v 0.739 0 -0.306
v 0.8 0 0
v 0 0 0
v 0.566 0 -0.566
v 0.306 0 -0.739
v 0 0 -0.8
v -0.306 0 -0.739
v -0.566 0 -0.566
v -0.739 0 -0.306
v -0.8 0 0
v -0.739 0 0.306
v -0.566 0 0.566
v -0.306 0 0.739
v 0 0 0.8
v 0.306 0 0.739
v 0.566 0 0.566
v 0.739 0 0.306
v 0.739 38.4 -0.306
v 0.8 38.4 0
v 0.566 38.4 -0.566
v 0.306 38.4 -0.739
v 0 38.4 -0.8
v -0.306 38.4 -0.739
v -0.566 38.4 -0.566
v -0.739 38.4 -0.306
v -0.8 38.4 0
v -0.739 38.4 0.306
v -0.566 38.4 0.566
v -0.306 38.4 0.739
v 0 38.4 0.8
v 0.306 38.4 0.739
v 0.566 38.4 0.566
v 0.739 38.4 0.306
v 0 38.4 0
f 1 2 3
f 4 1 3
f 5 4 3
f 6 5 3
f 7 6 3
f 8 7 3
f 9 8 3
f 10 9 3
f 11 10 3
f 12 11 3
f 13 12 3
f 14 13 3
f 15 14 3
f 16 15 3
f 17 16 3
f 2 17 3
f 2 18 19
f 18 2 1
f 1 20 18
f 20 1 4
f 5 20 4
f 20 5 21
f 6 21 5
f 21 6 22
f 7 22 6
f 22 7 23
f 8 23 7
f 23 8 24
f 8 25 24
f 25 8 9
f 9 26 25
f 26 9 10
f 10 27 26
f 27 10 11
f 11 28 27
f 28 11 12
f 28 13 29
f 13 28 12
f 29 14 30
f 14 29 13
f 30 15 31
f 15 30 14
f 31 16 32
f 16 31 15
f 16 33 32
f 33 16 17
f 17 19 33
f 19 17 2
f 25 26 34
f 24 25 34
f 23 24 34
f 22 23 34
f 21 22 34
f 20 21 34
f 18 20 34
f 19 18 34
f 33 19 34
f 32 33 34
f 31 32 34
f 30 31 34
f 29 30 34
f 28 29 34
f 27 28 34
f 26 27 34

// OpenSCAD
// file: ../p/4-4edge.scad
use <../lib.scad>
function ldraw_lib__4_4edge() = [
// 0 Circle 1.0
// 0 Name: 4-4edge.dat
// 0 Author: James Jessiman
// 0 !LDRAW_ORG Primitive UPDATE 2017-01
// 0 !LICENSE Licensed under CC BY 2.0 and CC BY 4.0 : see CAreadme.txt
// 
// 0 BFC CERTIFY CCW
  [0,"BFC","CERTIFY"],
  [0,"BFC","CCW"],
// 
// 0 !HISTORY 1998-12-15 [PTadmin] Official Update 1998-10
// 0 !HISTORY 2005-12-28 [PTadmin] Official Update 2005-01
// 0 !HISTORY 2007-06-24 [PTadmin] Header formatted for Contributor Agreement
// 0 !HISTORY 2008-07-01 [PTadmin] Official Update 2008-01
// 0 !HISTORY 2017-01-15 [Steffen] BFCed
// 0 !HISTORY 2017-12-30 [PTadmin] Official Update 2017-01
// 
// 
// 2 24 1 0 0 0.9239 0 0.3827
  [2,24,1,0,0,0.9239,0,0.3827],
// 2 24 0.9239 0 0.3827 0.7071 0 0.7071
  [2,24,0.9239,0,0.3827,0.7071,0,0.7071],
// 2 24 0.7071 0 0.7071 0.3827 0 0.9239
  [2,24,0.7071,0,0.7071,0.3827,0,0.9239],
// 2 24 0.3827 0 0.9239 0 0 1
  [2,24,0.3827,0,0.9239,0,0,1],
// 2 24 0 0 1 -0.3827 0 0.9239
  [2,24,0,0,1,-0.3827,0,0.9239],
// 2 24 -0.3827 0 0.9239 -0.7071 0 0.7071
  [2,24,-0.3827,0,0.9239,-0.7071,0,0.7071],
// 2 24 -0.7071 0 0.7071 -0.9239 0 0.3827
  [2,24,-0.7071,0,0.7071,-0.9239,0,0.3827],
// 2 24 -0.9239 0 0.3827 -1 0 -0
  [2,24,-0.9239,0,0.3827,-1,0,-0],
// 2 24 -1 0 -0 -0.9239 0 -0.3827
  [2,24,-1,0,-0,-0.9239,0,-0.3827],
// 2 24 -0.9239 0 -0.3827 -0.7071 0 -0.7071
  [2,24,-0.9239,0,-0.3827,-0.7071,0,-0.7071],
// 2 24 -0.7071 0 -0.7071 -0.3827 0 -0.9239
  [2,24,-0.7071,0,-0.7071,-0.3827,0,-0.9239],
// 2 24 -0.3827 0 -0.9239 0 0 -1
  [2,24,-0.3827,0,-0.9239,0,0,-1],
// 2 24 0 0 -1 0.3827 0 -0.9239
  [2,24,0,0,-1,0.3827,0,-0.9239],
// 2 24 0.3827 0 -0.9239 0.7071 0 -0.7071
  [2,24,0.3827,0,-0.9239,0.7071,0,-0.7071],
// 2 24 0.7071 0 -0.7071 0.9239 0 -0.3827
  [2,24,0.7071,0,-0.7071,0.9239,0,-0.3827],
// 2 24 0.9239 0 -0.3827 1 0 0
  [2,24,0.9239,0,-0.3827,1,0,0],
];
module ldraw_lib__4_4edge(step=0, col=false, unit=2/5, alt=false, line=0.2, solid=!$preview)
    makepoly(ldraw_lib__4_4edge(), step=step, col=col, unit=unit, alt=alt, line=line, solid=solid);
ldraw_lib__4_4edge(line=0.2);
// file: ../p/4-4cyli.scad
use <../lib.scad>
function ldraw_lib__4_4cyli() = [
// 0 Cylinder 1.0
// 0 Name: 4-4cyli.dat
// 0 Author: James Jessiman
// 0 !LDRAW_ORG Primitive UPDATE 2005-01
// 0 !LICENSE Licensed under CC BY 2.0 and CC BY 4.0 : see CAreadme.txt
// 
// 0 BFC CERTIFY CCW
  [0,"BFC","CERTIFY"],
  [0,"BFC","CCW"],
// 
// 0 !HISTORY 1998-12-15 [PTadmin] Official Update 1998-10
// 0 !HISTORY 2002-03-23 [sbliss] Added BFC statement; merged headers from files in distributions LDraw 0.27 and Complete.
// 0 !HISTORY 2002-04-25 [PTadmin] Official Update 2002-02
// 0 !HISTORY 2004-12-14 [guyvivan] BFC CCW
// 0 !HISTORY 2005-12-28 [PTadmin] Official Update 2005-01
// 0 !HISTORY 2007-06-24 [PTadmin] Header formatted for Contributor Agreement
// 0 !HISTORY 2008-07-01 [PTadmin] Official Update 2008-01
// 
// 
// 4 16 1 1 0 0.9239 1 0.3827 0.9239 0 0.3827 1 0 0
  [4,16,1,1,0,0.9239,1,0.3827,0.9239,0,0.3827,1,0,0],
// 5 24 1 0 0 1 1 0 0.9239 0 0.3827 0.9239 0 -0.3827
  [5,24,1,0,0,1,1,0,0.9239,0,0.3827,0.9239,0,-0.3827],
// 4 16 0.9239 1 0.3827 0.7071 1 0.7071 0.7071 0 0.7071 0.9239 0 0.3827
  [4,16,0.9239,1,0.3827,0.7071,1,0.7071,0.7071,0,0.7071,0.9239,0,0.3827],
// 5 24 0.9239 0 0.3827 0.9239 1 0.3827 0.7071 0 0.7071 1 0 0
  [5,24,0.9239,0,0.3827,0.9239,1,0.3827,0.7071,0,0.7071,1,0,0],
// 4 16 0.7071 1 0.7071 0.3827 1 0.9239 0.3827 0 0.9239 0.7071 0 0.7071
  [4,16,0.7071,1,0.7071,0.3827,1,0.9239,0.3827,0,0.9239,0.7071,0,0.7071],
// 5 24 0.7071 0 0.7071 0.7071 1 0.7071 0.3827 0 0.9239 0.9239 0 0.3827
  [5,24,0.7071,0,0.7071,0.7071,1,0.7071,0.3827,0,0.9239,0.9239,0,0.3827],
// 4 16 0.3827 1 0.9239 0 1 1 0 0 1 0.3827 0 0.9239
  [4,16,0.3827,1,0.9239,0,1,1,0,0,1,0.3827,0,0.9239],
// 5 24 0.3827 0 0.9239 0.3827 1 0.9239 0 0 1 0.7071 0 0.7071
  [5,24,0.3827,0,0.9239,0.3827,1,0.9239,0,0,1,0.7071,0,0.7071],
// 4 16 0 1 1 -0.3827 1 0.9239 -0.3827 0 0.9239 0 0 1
  [4,16,0,1,1,-0.3827,1,0.9239,-0.3827,0,0.9239,0,0,1],
// 5 24 0 0 1 0 1 1 -0.3827 0 0.9239 0.3827 0 0.9239
  [5,24,0,0,1,0,1,1,-0.3827,0,0.9239,0.3827,0,0.9239],
// 4 16 -0.3827 1 0.9239 -0.7071 1 0.7071 -0.7071 0 0.7071 -0.3827 0 0.9239
  [4,16,-0.3827,1,0.9239,-0.7071,1,0.7071,-0.7071,0,0.7071,-0.3827,0,0.9239],
// 5 24 -0.3827 0 0.9239 -0.3827 1 0.9239 -0.7071 0 0.7071 0 0 1
  [5,24,-0.3827,0,0.9239,-0.3827,1,0.9239,-0.7071,0,0.7071,0,0,1],
// 4 16 -0.7071 1 0.7071 -0.9239 1 0.3827 -0.9239 0 0.3827 -0.7071 0 0.7071
  [4,16,-0.7071,1,0.7071,-0.9239,1,0.3827,-0.9239,0,0.3827,-0.7071,0,0.7071],
// 5 24 -0.7071 0 0.7071 -0.7071 1 0.7071 -0.9239 0 0.3827 -0.3827 0 0.9239
  [5,24,-0.7071,0,0.7071,-0.7071,1,0.7071,-0.9239,0,0.3827,-0.3827,0,0.9239],
// 4 16 -0.9239 1 0.3827 -1 1 0 -1 0 0 -0.9239 0 0.3827
  [4,16,-0.9239,1,0.3827,-1,1,0,-1,0,0,-0.9239,0,0.3827],
// 5 24 -0.9239 0 0.3827 -0.9239 1 0.3827 -1 0 0 -0.7071 0 0.7071
  [5,24,-0.9239,0,0.3827,-0.9239,1,0.3827,-1,0,0,-0.7071,0,0.7071],
// 4 16 -1 1 0 -0.9239 1 -0.3827 -0.9239 0 -0.3827 -1 0 0
  [4,16,-1,1,0,-0.9239,1,-0.3827,-0.9239,0,-0.3827,-1,0,0],
// 5 24 -1 0 0 -1 1 0 -0.9239 0 -0.3827 -0.9239 0 0.3827
  [5,24,-1,0,0,-1,1,0,-0.9239,0,-0.3827,-0.9239,0,0.3827],
// 4 16 -0.9239 1 -0.3827 -0.7071 1 -0.7071 -0.7071 0 -0.7071 -0.9239 0 -0.3827
  [4,16,-0.9239,1,-0.3827,-0.7071,1,-0.7071,-0.7071,0,-0.7071,-0.9239,0,-0.3827],
// 5 24 -0.9239 0 -0.3827 -0.9239 1 -0.3827 -0.7071 0 -0.7071 -1 0 0
  [5,24,-0.9239,0,-0.3827,-0.9239,1,-0.3827,-0.7071,0,-0.7071,-1,0,0],
// 4 16 -0.7071 1 -0.7071 -0.3827 1 -0.9239 -0.3827 0 -0.9239 -0.7071 0 -0.7071
  [4,16,-0.7071,1,-0.7071,-0.3827,1,-0.9239,-0.3827,0,-0.9239,-0.7071,0,-0.7071],
// 5 24 -0.7071 0 -0.7071 -0.7071 1 -0.7071 -0.3827 0 -0.9239 -0.9239 0 -0.3827
  [5,24,-0.7071,0,-0.7071,-0.7071,1,-0.7071,-0.3827,0,-0.9239,-0.9239,0,-0.3827],
// 4 16 -0.3827 1 -0.9239 0 1 -1 0 0 -1 -0.3827 0 -0.9239
  [4,16,-0.3827,1,-0.9239,0,1,-1,0,0,-1,-0.3827,0,-0.9239],
// 5 24 -0.3827 0 -0.9239 -0.3827 1 -0.9239 0 0 -1 -0.7071 0 -0.7071
  [5,24,-0.3827,0,-0.9239,-0.3827,1,-0.9239,0,0,-1,-0.7071,0,-0.7071],
// 4 16 0 1 -1 0.3827 1 -0.9239 0.3827 0 -0.9239 0 0 -1
  [4,16,0,1,-1,0.3827,1,-0.9239,0.3827,0,-0.9239,0,0,-1],
// 5 24 0 0 -1 0 1 -1 0.3827 0 -0.9239 -0.3827 0 -0.9239
  [5,24,0,0,-1,0,1,-1,0.3827,0,-0.9239,-0.3827,0,-0.9239],
// 4 16 0.3827 1 -0.9239 0.7071 1 -0.7071 0.7071 0 -0.7071 0.3827 0 -0.9239
  [4,16,0.3827,1,-0.9239,0.7071,1,-0.7071,0.7071,0,-0.7071,0.3827,0,-0.9239],
// 5 24 0.3827 0 -0.9239 0.3827 1 -0.9239 0.7071 0 -0.7071 0 0 -1
  [5,24,0.3827,0,-0.9239,0.3827,1,-0.9239,0.7071,0,-0.7071,0,0,-1],
// 4 16 0.7071 1 -0.7071 0.9239 1 -0.3827 0.9239 0 -0.3827 0.7071 0 -0.7071
  [4,16,0.7071,1,-0.7071,0.9239,1,-0.3827,0.9239,0,-0.3827,0.7071,0,-0.7071],
// 5 24 0.7071 0 -0.7071 0.7071 1 -0.7071 0.9239 0 -0.3827 0.3827 0 -0.9239
  [5,24,0.7071,0,-0.7071,0.7071,1,-0.7071,0.9239,0,-0.3827,0.3827,0,-0.9239],
// 4 16 0.9239 1 -0.3827 1 1 0 1 0 0 0.9239 0 -0.3827
  [4,16,0.9239,1,-0.3827,1,1,0,1,0,0,0.9239,0,-0.3827],
// 5 24 0.9239 0 -0.3827 0.9239 1 -0.3827 1 0 0 0.7071 0 -0.7071
  [5,24,0.9239,0,-0.3827,0.9239,1,-0.3827,1,0,0,0.7071,0,-0.7071],
// 0
];
module ldraw_lib__4_4cyli(step=0, col=false, unit=2/5, alt=false, line=0.2, solid=!$preview)
    makepoly(ldraw_lib__4_4cyli(), step=step, col=col, unit=unit, alt=alt, line=line, solid=solid);
ldraw_lib__4_4cyli(line=0.2);
// file: ../p/4-4disc.scad
use <../lib.scad>
function ldraw_lib__4_4disc() = [
// 0 Disc 1.0
// 0 Name: 4-4disc.dat
// 0 Author: James Jessiman
// 0 !LDRAW_ORG Primitive UPDATE 2002-02
// 0 !LICENSE Licensed under CC BY 2.0 and CC BY 4.0 : see CAreadme.txt
// 
// 0 BFC CERTIFY CCW
  [0,"BFC","CERTIFY"],
  [0,"BFC","CCW"],
// 
// 0 !HISTORY 1998-12-15 [PTadmin] Official Update 1998-10
// 0 !HISTORY 2002-03-23 [sbliss] Added BFC statement
// 0 !HISTORY 2002-04-25 [PTadmin] Official Update 2002-02
// 0 !HISTORY 2007-06-24 [PTadmin] Header formatted for Contributor Agreement
// 0 !HISTORY 2008-07-01 [PTadmin] Official Update 2008-01
// 
// 
// 3 16 0 0 0 1 0 0 0.9239 0 0.3827
  [3,16,0,0,0,1,0,0,0.9239,0,0.3827],
// 3 16 0 0 0 0.9239 0 0.3827 0.7071 0 0.7071
  [3,16,0,0,0,0.9239,0,0.3827,0.7071,0,0.7071],
// 3 16 0 0 0 0.7071 0 0.7071 0.3827 0 0.9239
  [3,16,0,0,0,0.7071,0,0.7071,0.3827,0,0.9239],
// 3 16 0 0 0 0.3827 0 0.9239 0 0 1
  [3,16,0,0,0,0.3827,0,0.9239,0,0,1],
// 3 16 0 0 0 0 0 1 -0.3827 0 0.9239
  [3,16,0,0,0,0,0,1,-0.3827,0,0.9239],
// 3 16 0 0 0 -0.3827 0 0.9239 -0.7071 0 0.7071
  [3,16,0,0,0,-0.3827,0,0.9239,-0.7071,0,0.7071],
// 3 16 0 0 0 -0.7071 0 0.7071 -0.9239 0 0.3827
  [3,16,0,0,0,-0.7071,0,0.7071,-0.9239,0,0.3827],
// 3 16 0 0 0 -0.9239 0 0.3827 -1 0 -0
  [3,16,0,0,0,-0.9239,0,0.3827,-1,0,-0],
// 3 16 0 0 0 -1 0 -0 -0.9239 0 -0.3827
  [3,16,0,0,0,-1,0,-0,-0.9239,0,-0.3827],
// 3 16 0 0 0 -0.9239 0 -0.3827 -0.7071 0 -0.7071
  [3,16,0,0,0,-0.9239,0,-0.3827,-0.7071,0,-0.7071],
// 3 16 0 0 0 -0.7071 0 -0.7071 -0.3827 0 -0.9239
  [3,16,0,0,0,-0.7071,0,-0.7071,-0.3827,0,-0.9239],
// 3 16 0 0 0 -0.3827 0 -0.9239 0 0 -1
  [3,16,0,0,0,-0.3827,0,-0.9239,0,0,-1],
// 3 16 0 0 0 0 0 -1 0.3827 0 -0.9239
  [3,16,0,0,0,0,0,-1,0.3827,0,-0.9239],
// 3 16 0 0 0 0.3827 0 -0.9239 0.7071 0 -0.7071
  [3,16,0,0,0,0.3827,0,-0.9239,0.7071,0,-0.7071],
// 3 16 0 0 0 0.7071 0 -0.7071 0.9239 0 -0.3827
  [3,16,0,0,0,0.7071,0,-0.7071,0.9239,0,-0.3827],
// 3 16 0 0 0 0.9239 0 -0.3827 1 0 0
  [3,16,0,0,0,0.9239,0,-0.3827,1,0,0],
// 0
];
module ldraw_lib__4_4disc(step=0, col=false, unit=2/5, alt=false, line=0.2, solid=!$preview)
    makepoly(ldraw_lib__4_4disc(), step=step, col=col, unit=unit, alt=alt, line=line, solid=solid);
ldraw_lib__4_4disc(line=0.2);
// file: ../p/4-4cylc.scad
use <../lib.scad>
use <4-4cyli.scad>
use <4-4disc.scad>
use <4-4edge.scad>
function ldraw_lib__4_4cylc() = [
// 0 Cylinder Closed 1.0
// 0 Name: 4-4cylc.dat
// 0 Author: Alex Taylor [anathema]
// 0 !LDRAW_ORG Primitive UPDATE 2009-02
// 0 !LICENSE Licensed under CC BY 2.0 and CC BY 4.0 : see CAreadme.txt
// 
// 0 BFC CERTIFY CCW
  [0,"BFC","CERTIFY"],
  [0,"BFC","CCW"],
// 
// 0 !HISTORY 2008-12-29 [cwdee] Removed one disc
// 0 !HISTORY 2009-09-03 [PTadmin] Official Update 2009-02
// 
// 
// 1 16 0 0 0 1 0 0 0 1 0 0 0 1 4-4edge.dat
  [1,16,0,0,0,1,0,0,0,1,0,0,0,1, ldraw_lib__4_4edge()],
// 1 16 0 1 0 1 0 0 0 1 0 0 0 1 4-4edge.dat
  [1,16,0,1,0,1,0,0,0,1,0,0,0,1, ldraw_lib__4_4edge()],
// 1 16 0 0 0 1 0 0 0 1 0 0 0 1 4-4disc.dat
  [1,16,0,0,0,1,0,0,0,1,0,0,0,1, ldraw_lib__4_4disc()],
// 1 16 0 0 0 1 0 0 0 1 0 0 0 1 4-4cyli.dat
  [1,16,0,0,0,1,0,0,0,1,0,0,0,1, ldraw_lib__4_4cyli()],
// 0
];
module ldraw_lib__4_4cylc(step=0, col=false, unit=2/5, alt=false, line=0.2, solid=!$preview)
    makepoly(ldraw_lib__4_4cylc(), step=step, col=col, unit=unit, alt=alt, line=line, solid=solid);
ldraw_lib__4_4cylc(line=0.2);
// main file
use <../lib.scad>
use <../p/4-4cylc.scad>
use <../p/4-4disc.scad>
function ldraw_lib__u9375() = [
// 0 ~Electric Technic Motor Steel Axle
// 0 Name: u9375.dat
// 0 Author: Chris Dee [cwdee]
// 0 !LDRAW_ORG Part UPDATE 2020-02
// 0 !LICENSE Licensed under CC BY 2.0 and CC BY 4.0 : see CAreadme.txt
// 
// 0 BFC CERTIFY CCW
  [0,"BFC","CERTIFY"],
  [0,"BFC","CCW"],
// 
// 0 !KEYWORDS 12V, 4.5V, rotor
// 
// 0 !HISTORY 2018-03-31 [cwdee] Adjust origin and shorten
// 0 !HISTORY 2020-09-05 [PTadmin] Official Update 2020-02
// 
// 
// 1 16 0 0 0 2 0 0 0 0 2 0 96 0 4-4cylc.dat
  [1,16,0,0,0,2,0,0,0,0,2,0,96,0, ldraw_lib__4_4cylc()],
// 1 16 0 0 96 -2 0 0 0 0 2 0 -1 0 4-4disc.dat
  [1,16,0,0,96,-2,0,0,0,0,2,0,-1,0, ldraw_lib__4_4disc()],
];
module ldraw_lib__u9375(step=0, col=false, unit=2/5, alt=false, line=0.2, solid=!$preview)
    makepoly(ldraw_lib__u9375(), step=step, col=col, unit=unit, alt=alt, line=line, solid=solid);
ldraw_lib__u9375(line=0.2);
